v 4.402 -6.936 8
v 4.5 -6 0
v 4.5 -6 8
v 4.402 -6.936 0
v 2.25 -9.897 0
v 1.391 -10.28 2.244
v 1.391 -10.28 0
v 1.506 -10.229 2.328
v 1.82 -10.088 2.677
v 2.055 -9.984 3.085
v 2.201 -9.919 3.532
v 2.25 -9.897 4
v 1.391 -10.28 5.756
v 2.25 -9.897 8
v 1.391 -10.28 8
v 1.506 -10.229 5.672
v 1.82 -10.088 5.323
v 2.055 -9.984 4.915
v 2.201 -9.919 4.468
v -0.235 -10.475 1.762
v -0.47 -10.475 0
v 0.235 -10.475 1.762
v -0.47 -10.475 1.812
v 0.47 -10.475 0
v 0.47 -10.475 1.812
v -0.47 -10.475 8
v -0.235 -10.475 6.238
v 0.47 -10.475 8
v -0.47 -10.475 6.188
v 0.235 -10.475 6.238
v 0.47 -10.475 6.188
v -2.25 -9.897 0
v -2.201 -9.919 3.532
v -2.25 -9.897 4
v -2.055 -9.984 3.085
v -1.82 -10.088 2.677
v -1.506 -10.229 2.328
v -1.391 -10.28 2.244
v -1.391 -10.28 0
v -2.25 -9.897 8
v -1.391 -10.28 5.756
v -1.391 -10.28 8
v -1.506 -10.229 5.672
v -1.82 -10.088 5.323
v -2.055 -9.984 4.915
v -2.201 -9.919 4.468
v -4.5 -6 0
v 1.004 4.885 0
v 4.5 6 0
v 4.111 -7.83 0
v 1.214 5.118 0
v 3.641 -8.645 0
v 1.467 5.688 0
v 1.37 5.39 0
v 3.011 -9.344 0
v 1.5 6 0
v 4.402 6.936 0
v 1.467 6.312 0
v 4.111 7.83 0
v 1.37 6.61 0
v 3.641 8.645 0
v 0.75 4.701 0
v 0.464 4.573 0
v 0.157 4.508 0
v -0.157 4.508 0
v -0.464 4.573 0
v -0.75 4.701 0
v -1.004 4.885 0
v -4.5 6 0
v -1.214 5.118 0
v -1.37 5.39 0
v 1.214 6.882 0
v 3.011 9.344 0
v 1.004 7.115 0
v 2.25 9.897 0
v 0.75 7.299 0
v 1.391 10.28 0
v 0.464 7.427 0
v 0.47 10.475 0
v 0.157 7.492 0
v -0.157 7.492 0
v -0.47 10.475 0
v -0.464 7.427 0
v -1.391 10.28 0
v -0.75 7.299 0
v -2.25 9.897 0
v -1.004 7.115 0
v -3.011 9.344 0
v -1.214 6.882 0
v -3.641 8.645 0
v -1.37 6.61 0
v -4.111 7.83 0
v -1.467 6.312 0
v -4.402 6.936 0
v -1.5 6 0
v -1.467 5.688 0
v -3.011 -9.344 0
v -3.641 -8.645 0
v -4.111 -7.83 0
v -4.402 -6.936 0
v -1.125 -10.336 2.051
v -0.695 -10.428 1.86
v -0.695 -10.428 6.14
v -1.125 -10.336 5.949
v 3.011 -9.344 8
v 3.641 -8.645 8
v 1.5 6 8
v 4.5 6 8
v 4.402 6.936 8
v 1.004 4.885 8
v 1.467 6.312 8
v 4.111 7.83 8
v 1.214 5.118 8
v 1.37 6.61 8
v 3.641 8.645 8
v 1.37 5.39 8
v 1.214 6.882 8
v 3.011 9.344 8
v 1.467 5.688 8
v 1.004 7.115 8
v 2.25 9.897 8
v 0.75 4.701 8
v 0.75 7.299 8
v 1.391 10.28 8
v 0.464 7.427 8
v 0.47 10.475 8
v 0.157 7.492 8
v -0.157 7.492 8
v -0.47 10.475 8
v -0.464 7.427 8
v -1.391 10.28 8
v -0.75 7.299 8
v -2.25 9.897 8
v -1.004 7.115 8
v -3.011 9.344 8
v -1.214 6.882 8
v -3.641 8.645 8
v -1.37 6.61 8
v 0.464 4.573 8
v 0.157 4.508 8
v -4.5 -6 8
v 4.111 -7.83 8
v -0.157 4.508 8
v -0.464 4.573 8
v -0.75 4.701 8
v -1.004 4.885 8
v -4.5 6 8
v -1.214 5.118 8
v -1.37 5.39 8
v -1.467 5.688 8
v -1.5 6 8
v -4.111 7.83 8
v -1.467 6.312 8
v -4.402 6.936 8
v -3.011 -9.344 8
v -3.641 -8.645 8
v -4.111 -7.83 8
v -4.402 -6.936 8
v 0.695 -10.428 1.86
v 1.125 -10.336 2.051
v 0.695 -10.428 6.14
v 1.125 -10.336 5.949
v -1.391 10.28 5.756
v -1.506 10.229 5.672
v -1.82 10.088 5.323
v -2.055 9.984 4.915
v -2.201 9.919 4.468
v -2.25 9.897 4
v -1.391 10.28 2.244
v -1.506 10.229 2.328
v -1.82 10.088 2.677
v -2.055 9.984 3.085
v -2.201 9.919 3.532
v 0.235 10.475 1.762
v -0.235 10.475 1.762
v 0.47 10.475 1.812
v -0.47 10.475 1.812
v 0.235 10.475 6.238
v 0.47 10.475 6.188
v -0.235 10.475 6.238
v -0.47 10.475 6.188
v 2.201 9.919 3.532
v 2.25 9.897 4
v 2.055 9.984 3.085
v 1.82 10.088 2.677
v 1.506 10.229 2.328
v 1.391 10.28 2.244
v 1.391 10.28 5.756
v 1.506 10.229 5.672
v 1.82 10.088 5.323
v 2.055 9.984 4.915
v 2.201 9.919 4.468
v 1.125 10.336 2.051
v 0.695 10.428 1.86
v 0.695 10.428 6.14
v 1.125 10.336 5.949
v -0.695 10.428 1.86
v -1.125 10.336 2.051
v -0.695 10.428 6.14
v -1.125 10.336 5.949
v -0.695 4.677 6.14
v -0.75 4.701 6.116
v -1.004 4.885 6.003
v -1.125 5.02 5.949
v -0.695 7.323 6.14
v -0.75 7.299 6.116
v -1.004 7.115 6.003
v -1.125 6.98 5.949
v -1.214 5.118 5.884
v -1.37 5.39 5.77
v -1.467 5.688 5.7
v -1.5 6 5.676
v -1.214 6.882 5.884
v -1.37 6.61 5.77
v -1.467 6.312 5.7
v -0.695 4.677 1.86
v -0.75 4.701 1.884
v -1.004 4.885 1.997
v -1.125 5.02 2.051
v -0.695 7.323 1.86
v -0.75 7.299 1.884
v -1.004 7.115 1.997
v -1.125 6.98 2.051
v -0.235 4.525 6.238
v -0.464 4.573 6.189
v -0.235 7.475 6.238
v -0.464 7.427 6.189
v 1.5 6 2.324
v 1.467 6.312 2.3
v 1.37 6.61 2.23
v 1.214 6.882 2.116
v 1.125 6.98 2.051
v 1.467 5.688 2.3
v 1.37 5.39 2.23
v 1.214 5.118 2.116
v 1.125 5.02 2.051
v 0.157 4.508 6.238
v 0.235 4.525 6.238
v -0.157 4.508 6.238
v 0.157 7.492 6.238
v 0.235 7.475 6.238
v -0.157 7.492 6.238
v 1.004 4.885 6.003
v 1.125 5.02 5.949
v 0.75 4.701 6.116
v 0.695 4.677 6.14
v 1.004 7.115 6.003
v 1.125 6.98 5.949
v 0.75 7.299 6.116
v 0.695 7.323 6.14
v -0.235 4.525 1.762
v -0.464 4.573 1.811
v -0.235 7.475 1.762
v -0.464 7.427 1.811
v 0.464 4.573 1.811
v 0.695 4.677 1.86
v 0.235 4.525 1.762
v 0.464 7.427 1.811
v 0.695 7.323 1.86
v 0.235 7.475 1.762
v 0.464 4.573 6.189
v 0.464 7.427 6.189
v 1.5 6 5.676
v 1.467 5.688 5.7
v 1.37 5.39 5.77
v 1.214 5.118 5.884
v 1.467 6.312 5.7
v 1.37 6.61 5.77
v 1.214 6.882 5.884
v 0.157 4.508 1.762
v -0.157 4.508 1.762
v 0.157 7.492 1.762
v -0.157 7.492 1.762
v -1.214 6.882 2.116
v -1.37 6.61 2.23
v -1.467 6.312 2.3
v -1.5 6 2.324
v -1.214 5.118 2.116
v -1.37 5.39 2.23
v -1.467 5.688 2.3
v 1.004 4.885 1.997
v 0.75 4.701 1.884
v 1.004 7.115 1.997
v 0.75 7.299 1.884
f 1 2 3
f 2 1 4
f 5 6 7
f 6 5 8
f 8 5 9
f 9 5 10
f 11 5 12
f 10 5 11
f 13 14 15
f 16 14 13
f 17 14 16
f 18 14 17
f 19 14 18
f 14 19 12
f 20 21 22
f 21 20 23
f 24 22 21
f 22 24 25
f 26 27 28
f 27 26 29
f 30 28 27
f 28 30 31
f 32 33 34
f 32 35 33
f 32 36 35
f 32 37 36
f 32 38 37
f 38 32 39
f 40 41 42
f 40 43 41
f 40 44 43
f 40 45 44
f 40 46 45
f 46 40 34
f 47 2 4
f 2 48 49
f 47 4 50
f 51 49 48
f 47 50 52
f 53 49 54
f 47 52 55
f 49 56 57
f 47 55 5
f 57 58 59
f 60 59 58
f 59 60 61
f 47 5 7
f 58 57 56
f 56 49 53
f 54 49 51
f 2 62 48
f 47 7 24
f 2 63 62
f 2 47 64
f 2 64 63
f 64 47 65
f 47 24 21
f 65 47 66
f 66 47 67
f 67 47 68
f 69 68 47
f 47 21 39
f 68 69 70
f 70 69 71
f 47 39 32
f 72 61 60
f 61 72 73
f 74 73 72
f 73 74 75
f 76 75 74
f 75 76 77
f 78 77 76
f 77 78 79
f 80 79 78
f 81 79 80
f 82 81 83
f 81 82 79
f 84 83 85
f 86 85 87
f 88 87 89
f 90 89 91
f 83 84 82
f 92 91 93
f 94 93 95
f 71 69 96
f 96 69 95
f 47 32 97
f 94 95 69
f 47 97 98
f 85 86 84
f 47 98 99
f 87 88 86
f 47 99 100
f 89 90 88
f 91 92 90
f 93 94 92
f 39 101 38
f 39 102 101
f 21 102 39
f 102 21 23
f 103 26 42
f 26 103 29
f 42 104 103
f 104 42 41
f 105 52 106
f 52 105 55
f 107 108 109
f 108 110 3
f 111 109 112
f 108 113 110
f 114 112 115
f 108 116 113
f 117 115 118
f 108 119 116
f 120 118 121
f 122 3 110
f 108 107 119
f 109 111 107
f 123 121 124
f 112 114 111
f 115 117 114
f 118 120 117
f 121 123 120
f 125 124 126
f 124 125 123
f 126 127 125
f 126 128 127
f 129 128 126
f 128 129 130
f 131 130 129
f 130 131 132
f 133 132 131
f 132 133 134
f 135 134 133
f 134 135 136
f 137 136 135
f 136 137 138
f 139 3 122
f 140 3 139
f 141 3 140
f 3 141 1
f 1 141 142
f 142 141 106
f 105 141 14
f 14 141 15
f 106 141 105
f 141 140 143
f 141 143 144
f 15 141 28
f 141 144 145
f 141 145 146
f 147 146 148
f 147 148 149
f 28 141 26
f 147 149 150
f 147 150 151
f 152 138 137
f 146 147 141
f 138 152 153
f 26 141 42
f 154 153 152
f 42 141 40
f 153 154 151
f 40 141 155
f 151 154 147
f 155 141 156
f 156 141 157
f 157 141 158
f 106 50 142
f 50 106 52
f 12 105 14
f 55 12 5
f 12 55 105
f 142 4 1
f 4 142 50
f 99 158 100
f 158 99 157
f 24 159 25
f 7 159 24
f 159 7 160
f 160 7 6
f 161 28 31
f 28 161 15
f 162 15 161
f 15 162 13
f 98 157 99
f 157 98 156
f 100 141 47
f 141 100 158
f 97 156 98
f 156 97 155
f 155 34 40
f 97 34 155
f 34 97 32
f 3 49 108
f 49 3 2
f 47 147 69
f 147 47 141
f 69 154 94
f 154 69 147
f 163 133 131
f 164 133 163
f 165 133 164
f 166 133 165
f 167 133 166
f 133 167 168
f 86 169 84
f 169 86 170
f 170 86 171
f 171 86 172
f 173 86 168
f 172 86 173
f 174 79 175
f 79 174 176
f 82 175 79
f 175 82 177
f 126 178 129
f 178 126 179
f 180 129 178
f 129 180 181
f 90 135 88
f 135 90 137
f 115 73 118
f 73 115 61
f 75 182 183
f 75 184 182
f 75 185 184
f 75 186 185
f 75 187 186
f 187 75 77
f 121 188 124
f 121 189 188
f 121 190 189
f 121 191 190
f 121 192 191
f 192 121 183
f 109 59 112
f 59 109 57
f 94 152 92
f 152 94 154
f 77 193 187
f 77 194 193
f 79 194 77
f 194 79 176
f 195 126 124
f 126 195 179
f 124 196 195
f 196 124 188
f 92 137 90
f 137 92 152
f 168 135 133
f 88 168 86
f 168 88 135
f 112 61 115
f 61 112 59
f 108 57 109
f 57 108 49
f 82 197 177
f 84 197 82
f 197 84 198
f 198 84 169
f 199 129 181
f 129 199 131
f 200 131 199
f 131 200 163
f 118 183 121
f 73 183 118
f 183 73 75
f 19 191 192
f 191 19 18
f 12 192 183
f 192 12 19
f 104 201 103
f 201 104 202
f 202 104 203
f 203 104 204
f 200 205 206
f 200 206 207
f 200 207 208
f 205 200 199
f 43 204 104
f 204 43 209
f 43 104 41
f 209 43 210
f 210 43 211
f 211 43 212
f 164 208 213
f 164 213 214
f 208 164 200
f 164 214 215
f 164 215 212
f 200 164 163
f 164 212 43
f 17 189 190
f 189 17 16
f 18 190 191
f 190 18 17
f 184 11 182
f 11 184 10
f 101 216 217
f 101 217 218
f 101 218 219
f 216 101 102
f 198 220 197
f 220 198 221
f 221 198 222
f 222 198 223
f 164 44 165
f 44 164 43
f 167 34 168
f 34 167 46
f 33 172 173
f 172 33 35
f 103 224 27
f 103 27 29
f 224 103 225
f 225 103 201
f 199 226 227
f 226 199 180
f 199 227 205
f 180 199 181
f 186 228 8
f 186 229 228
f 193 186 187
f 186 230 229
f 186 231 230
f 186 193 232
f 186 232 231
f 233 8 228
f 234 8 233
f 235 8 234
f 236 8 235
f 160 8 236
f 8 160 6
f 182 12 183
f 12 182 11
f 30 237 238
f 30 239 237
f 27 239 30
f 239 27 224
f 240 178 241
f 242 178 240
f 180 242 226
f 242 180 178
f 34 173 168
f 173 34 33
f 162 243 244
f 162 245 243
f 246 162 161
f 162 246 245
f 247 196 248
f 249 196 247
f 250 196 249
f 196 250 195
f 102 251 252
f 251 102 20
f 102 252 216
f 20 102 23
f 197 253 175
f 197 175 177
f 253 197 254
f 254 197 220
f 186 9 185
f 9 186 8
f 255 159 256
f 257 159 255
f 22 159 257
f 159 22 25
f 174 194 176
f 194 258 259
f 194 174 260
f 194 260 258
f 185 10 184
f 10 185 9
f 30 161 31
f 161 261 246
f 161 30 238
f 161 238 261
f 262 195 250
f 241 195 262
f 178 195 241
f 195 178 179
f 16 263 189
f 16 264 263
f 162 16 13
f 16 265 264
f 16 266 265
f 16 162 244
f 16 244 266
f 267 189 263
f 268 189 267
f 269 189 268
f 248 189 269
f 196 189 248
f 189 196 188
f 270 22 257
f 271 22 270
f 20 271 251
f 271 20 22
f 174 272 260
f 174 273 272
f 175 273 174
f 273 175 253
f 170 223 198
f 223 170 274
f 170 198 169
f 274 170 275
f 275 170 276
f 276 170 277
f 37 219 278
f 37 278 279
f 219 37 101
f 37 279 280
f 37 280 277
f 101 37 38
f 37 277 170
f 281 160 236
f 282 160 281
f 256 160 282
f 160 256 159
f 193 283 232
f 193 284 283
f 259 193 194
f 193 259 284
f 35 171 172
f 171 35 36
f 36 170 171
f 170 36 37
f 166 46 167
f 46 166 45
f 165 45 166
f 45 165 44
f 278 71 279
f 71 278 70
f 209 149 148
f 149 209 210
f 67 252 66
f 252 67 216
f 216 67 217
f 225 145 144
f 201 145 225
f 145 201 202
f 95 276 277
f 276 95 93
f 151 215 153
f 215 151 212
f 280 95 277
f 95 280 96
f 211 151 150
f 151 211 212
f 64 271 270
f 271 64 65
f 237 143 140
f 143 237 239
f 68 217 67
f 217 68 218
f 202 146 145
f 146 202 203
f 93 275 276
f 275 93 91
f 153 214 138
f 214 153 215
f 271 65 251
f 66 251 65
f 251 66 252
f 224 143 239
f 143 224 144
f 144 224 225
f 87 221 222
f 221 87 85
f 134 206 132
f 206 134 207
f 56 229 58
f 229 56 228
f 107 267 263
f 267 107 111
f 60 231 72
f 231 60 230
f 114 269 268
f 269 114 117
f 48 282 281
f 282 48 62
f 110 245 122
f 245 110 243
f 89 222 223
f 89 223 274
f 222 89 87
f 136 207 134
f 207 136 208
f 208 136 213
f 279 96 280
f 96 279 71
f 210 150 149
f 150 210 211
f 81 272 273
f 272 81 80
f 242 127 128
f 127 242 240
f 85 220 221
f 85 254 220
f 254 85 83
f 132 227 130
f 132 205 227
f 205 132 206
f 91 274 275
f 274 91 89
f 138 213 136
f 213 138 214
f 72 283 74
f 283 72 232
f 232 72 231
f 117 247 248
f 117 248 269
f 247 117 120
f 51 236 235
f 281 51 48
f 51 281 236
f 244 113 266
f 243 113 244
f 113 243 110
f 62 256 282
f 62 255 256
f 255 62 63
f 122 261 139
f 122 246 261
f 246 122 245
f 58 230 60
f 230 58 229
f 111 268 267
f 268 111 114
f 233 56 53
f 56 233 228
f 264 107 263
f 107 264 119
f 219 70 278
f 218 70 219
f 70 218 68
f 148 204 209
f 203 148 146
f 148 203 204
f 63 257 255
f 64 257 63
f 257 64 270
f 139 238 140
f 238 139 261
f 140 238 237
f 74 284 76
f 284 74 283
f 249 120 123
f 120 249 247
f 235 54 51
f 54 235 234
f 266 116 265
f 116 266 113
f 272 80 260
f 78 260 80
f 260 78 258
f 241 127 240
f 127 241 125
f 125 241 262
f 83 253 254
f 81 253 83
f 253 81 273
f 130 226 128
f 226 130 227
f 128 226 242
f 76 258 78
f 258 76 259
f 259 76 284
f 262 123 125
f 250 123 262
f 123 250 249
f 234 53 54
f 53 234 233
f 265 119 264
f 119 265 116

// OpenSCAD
$fn = 30;
radius = 8/2;
h = 8;
ww = 3; //wall width

module rod_end_2(radius, h, ww, tube_r) {
difference() {
union() {
translate([0,-ww*2,0]) rotate([0,0,0]) cylinder(r = 3*ww/2, h = h, center = true);
translate([0,0,0]) cube([ww*3, ww*4, h], center = true);
translate([0,ww*2,0]) rotate([0,0,180]) cylinder(r = 3*ww/2, h = h, center = true);
}
rotate([90,0,0]) cylinder(r = tube_r, h = 100, center = true);
translate([0,2*ww,0]) rotate([0,0,180]) cylinder(r = 3/2, h = 100, center = true);
}
}

module rod_end(radius, h, ww, tube_r) {
difference() {
union() {
for(i=[1,-1])
translate([ww*i,0, 0]) rotate([90,-90,90]) connector(); 
translate([0,ww,0]) cube([ww*3, ww*2, h], center = true);
translate([0,ww*2,0]) rotate([0,0,180]) cylinder(r = 3*ww/2, h = h, center = true);
}
//translate([0,-ww,0]) rotate([90,0,180]) cylinder(r = tube_r, h = 100);
translate([0,2*ww,0]) rotate([0,0,180]) cylinder(r = 3/2, h = 100, center = true);
}
}

module connector() {
difference() {
union() {
translate([0,ww*2,0]) cylinder(r = h/2, h = ww, center = true);
translate([0,ww/2,0]) cube([h, ww*3, ww], center = true);
}
translate([0,ww*2,0]) cylinder(r = 3/2, h = ww+2, center = true);
}
}

module band(radius, h, ww) {
difference() {
union() {
cylinder(r = radius + ww, h = h, center = true); //outer band

for(i=[1,-1]) //connectors
translate([(radius)*i,ww,0]) rotate([90,i*90,0]) connector(radius, h, ww);
}
union() {
cylinder(r = radius, h = h + 2, center = true);
translate([0,ww/2-100,0]) cube([(radius + ww)*2, 200, h+1], center=true);
}
}
}

module clamp(radius, h, ww) {
translate([0,0,h/2]){
translate([0,radius+ww,0]) rotate([90,90,90]) connector(radius, h, ww);
band(radius, h, ww);
scale([1,-1,1]) band(radius, h, ww);
}
}

//translate([0,radius+ww*9,3*h/2]) rotate(180) rod_end_2(radius, h, ww, 4.5/2);
//translate([0,radius+ww*5,h/2]) rod_end(radius, h, ww, 4.5/2);
//clamp(radius, h, ww);
translate([0,0,h/2]) rod_end_2(radius, h, ww, 4.5/2);
